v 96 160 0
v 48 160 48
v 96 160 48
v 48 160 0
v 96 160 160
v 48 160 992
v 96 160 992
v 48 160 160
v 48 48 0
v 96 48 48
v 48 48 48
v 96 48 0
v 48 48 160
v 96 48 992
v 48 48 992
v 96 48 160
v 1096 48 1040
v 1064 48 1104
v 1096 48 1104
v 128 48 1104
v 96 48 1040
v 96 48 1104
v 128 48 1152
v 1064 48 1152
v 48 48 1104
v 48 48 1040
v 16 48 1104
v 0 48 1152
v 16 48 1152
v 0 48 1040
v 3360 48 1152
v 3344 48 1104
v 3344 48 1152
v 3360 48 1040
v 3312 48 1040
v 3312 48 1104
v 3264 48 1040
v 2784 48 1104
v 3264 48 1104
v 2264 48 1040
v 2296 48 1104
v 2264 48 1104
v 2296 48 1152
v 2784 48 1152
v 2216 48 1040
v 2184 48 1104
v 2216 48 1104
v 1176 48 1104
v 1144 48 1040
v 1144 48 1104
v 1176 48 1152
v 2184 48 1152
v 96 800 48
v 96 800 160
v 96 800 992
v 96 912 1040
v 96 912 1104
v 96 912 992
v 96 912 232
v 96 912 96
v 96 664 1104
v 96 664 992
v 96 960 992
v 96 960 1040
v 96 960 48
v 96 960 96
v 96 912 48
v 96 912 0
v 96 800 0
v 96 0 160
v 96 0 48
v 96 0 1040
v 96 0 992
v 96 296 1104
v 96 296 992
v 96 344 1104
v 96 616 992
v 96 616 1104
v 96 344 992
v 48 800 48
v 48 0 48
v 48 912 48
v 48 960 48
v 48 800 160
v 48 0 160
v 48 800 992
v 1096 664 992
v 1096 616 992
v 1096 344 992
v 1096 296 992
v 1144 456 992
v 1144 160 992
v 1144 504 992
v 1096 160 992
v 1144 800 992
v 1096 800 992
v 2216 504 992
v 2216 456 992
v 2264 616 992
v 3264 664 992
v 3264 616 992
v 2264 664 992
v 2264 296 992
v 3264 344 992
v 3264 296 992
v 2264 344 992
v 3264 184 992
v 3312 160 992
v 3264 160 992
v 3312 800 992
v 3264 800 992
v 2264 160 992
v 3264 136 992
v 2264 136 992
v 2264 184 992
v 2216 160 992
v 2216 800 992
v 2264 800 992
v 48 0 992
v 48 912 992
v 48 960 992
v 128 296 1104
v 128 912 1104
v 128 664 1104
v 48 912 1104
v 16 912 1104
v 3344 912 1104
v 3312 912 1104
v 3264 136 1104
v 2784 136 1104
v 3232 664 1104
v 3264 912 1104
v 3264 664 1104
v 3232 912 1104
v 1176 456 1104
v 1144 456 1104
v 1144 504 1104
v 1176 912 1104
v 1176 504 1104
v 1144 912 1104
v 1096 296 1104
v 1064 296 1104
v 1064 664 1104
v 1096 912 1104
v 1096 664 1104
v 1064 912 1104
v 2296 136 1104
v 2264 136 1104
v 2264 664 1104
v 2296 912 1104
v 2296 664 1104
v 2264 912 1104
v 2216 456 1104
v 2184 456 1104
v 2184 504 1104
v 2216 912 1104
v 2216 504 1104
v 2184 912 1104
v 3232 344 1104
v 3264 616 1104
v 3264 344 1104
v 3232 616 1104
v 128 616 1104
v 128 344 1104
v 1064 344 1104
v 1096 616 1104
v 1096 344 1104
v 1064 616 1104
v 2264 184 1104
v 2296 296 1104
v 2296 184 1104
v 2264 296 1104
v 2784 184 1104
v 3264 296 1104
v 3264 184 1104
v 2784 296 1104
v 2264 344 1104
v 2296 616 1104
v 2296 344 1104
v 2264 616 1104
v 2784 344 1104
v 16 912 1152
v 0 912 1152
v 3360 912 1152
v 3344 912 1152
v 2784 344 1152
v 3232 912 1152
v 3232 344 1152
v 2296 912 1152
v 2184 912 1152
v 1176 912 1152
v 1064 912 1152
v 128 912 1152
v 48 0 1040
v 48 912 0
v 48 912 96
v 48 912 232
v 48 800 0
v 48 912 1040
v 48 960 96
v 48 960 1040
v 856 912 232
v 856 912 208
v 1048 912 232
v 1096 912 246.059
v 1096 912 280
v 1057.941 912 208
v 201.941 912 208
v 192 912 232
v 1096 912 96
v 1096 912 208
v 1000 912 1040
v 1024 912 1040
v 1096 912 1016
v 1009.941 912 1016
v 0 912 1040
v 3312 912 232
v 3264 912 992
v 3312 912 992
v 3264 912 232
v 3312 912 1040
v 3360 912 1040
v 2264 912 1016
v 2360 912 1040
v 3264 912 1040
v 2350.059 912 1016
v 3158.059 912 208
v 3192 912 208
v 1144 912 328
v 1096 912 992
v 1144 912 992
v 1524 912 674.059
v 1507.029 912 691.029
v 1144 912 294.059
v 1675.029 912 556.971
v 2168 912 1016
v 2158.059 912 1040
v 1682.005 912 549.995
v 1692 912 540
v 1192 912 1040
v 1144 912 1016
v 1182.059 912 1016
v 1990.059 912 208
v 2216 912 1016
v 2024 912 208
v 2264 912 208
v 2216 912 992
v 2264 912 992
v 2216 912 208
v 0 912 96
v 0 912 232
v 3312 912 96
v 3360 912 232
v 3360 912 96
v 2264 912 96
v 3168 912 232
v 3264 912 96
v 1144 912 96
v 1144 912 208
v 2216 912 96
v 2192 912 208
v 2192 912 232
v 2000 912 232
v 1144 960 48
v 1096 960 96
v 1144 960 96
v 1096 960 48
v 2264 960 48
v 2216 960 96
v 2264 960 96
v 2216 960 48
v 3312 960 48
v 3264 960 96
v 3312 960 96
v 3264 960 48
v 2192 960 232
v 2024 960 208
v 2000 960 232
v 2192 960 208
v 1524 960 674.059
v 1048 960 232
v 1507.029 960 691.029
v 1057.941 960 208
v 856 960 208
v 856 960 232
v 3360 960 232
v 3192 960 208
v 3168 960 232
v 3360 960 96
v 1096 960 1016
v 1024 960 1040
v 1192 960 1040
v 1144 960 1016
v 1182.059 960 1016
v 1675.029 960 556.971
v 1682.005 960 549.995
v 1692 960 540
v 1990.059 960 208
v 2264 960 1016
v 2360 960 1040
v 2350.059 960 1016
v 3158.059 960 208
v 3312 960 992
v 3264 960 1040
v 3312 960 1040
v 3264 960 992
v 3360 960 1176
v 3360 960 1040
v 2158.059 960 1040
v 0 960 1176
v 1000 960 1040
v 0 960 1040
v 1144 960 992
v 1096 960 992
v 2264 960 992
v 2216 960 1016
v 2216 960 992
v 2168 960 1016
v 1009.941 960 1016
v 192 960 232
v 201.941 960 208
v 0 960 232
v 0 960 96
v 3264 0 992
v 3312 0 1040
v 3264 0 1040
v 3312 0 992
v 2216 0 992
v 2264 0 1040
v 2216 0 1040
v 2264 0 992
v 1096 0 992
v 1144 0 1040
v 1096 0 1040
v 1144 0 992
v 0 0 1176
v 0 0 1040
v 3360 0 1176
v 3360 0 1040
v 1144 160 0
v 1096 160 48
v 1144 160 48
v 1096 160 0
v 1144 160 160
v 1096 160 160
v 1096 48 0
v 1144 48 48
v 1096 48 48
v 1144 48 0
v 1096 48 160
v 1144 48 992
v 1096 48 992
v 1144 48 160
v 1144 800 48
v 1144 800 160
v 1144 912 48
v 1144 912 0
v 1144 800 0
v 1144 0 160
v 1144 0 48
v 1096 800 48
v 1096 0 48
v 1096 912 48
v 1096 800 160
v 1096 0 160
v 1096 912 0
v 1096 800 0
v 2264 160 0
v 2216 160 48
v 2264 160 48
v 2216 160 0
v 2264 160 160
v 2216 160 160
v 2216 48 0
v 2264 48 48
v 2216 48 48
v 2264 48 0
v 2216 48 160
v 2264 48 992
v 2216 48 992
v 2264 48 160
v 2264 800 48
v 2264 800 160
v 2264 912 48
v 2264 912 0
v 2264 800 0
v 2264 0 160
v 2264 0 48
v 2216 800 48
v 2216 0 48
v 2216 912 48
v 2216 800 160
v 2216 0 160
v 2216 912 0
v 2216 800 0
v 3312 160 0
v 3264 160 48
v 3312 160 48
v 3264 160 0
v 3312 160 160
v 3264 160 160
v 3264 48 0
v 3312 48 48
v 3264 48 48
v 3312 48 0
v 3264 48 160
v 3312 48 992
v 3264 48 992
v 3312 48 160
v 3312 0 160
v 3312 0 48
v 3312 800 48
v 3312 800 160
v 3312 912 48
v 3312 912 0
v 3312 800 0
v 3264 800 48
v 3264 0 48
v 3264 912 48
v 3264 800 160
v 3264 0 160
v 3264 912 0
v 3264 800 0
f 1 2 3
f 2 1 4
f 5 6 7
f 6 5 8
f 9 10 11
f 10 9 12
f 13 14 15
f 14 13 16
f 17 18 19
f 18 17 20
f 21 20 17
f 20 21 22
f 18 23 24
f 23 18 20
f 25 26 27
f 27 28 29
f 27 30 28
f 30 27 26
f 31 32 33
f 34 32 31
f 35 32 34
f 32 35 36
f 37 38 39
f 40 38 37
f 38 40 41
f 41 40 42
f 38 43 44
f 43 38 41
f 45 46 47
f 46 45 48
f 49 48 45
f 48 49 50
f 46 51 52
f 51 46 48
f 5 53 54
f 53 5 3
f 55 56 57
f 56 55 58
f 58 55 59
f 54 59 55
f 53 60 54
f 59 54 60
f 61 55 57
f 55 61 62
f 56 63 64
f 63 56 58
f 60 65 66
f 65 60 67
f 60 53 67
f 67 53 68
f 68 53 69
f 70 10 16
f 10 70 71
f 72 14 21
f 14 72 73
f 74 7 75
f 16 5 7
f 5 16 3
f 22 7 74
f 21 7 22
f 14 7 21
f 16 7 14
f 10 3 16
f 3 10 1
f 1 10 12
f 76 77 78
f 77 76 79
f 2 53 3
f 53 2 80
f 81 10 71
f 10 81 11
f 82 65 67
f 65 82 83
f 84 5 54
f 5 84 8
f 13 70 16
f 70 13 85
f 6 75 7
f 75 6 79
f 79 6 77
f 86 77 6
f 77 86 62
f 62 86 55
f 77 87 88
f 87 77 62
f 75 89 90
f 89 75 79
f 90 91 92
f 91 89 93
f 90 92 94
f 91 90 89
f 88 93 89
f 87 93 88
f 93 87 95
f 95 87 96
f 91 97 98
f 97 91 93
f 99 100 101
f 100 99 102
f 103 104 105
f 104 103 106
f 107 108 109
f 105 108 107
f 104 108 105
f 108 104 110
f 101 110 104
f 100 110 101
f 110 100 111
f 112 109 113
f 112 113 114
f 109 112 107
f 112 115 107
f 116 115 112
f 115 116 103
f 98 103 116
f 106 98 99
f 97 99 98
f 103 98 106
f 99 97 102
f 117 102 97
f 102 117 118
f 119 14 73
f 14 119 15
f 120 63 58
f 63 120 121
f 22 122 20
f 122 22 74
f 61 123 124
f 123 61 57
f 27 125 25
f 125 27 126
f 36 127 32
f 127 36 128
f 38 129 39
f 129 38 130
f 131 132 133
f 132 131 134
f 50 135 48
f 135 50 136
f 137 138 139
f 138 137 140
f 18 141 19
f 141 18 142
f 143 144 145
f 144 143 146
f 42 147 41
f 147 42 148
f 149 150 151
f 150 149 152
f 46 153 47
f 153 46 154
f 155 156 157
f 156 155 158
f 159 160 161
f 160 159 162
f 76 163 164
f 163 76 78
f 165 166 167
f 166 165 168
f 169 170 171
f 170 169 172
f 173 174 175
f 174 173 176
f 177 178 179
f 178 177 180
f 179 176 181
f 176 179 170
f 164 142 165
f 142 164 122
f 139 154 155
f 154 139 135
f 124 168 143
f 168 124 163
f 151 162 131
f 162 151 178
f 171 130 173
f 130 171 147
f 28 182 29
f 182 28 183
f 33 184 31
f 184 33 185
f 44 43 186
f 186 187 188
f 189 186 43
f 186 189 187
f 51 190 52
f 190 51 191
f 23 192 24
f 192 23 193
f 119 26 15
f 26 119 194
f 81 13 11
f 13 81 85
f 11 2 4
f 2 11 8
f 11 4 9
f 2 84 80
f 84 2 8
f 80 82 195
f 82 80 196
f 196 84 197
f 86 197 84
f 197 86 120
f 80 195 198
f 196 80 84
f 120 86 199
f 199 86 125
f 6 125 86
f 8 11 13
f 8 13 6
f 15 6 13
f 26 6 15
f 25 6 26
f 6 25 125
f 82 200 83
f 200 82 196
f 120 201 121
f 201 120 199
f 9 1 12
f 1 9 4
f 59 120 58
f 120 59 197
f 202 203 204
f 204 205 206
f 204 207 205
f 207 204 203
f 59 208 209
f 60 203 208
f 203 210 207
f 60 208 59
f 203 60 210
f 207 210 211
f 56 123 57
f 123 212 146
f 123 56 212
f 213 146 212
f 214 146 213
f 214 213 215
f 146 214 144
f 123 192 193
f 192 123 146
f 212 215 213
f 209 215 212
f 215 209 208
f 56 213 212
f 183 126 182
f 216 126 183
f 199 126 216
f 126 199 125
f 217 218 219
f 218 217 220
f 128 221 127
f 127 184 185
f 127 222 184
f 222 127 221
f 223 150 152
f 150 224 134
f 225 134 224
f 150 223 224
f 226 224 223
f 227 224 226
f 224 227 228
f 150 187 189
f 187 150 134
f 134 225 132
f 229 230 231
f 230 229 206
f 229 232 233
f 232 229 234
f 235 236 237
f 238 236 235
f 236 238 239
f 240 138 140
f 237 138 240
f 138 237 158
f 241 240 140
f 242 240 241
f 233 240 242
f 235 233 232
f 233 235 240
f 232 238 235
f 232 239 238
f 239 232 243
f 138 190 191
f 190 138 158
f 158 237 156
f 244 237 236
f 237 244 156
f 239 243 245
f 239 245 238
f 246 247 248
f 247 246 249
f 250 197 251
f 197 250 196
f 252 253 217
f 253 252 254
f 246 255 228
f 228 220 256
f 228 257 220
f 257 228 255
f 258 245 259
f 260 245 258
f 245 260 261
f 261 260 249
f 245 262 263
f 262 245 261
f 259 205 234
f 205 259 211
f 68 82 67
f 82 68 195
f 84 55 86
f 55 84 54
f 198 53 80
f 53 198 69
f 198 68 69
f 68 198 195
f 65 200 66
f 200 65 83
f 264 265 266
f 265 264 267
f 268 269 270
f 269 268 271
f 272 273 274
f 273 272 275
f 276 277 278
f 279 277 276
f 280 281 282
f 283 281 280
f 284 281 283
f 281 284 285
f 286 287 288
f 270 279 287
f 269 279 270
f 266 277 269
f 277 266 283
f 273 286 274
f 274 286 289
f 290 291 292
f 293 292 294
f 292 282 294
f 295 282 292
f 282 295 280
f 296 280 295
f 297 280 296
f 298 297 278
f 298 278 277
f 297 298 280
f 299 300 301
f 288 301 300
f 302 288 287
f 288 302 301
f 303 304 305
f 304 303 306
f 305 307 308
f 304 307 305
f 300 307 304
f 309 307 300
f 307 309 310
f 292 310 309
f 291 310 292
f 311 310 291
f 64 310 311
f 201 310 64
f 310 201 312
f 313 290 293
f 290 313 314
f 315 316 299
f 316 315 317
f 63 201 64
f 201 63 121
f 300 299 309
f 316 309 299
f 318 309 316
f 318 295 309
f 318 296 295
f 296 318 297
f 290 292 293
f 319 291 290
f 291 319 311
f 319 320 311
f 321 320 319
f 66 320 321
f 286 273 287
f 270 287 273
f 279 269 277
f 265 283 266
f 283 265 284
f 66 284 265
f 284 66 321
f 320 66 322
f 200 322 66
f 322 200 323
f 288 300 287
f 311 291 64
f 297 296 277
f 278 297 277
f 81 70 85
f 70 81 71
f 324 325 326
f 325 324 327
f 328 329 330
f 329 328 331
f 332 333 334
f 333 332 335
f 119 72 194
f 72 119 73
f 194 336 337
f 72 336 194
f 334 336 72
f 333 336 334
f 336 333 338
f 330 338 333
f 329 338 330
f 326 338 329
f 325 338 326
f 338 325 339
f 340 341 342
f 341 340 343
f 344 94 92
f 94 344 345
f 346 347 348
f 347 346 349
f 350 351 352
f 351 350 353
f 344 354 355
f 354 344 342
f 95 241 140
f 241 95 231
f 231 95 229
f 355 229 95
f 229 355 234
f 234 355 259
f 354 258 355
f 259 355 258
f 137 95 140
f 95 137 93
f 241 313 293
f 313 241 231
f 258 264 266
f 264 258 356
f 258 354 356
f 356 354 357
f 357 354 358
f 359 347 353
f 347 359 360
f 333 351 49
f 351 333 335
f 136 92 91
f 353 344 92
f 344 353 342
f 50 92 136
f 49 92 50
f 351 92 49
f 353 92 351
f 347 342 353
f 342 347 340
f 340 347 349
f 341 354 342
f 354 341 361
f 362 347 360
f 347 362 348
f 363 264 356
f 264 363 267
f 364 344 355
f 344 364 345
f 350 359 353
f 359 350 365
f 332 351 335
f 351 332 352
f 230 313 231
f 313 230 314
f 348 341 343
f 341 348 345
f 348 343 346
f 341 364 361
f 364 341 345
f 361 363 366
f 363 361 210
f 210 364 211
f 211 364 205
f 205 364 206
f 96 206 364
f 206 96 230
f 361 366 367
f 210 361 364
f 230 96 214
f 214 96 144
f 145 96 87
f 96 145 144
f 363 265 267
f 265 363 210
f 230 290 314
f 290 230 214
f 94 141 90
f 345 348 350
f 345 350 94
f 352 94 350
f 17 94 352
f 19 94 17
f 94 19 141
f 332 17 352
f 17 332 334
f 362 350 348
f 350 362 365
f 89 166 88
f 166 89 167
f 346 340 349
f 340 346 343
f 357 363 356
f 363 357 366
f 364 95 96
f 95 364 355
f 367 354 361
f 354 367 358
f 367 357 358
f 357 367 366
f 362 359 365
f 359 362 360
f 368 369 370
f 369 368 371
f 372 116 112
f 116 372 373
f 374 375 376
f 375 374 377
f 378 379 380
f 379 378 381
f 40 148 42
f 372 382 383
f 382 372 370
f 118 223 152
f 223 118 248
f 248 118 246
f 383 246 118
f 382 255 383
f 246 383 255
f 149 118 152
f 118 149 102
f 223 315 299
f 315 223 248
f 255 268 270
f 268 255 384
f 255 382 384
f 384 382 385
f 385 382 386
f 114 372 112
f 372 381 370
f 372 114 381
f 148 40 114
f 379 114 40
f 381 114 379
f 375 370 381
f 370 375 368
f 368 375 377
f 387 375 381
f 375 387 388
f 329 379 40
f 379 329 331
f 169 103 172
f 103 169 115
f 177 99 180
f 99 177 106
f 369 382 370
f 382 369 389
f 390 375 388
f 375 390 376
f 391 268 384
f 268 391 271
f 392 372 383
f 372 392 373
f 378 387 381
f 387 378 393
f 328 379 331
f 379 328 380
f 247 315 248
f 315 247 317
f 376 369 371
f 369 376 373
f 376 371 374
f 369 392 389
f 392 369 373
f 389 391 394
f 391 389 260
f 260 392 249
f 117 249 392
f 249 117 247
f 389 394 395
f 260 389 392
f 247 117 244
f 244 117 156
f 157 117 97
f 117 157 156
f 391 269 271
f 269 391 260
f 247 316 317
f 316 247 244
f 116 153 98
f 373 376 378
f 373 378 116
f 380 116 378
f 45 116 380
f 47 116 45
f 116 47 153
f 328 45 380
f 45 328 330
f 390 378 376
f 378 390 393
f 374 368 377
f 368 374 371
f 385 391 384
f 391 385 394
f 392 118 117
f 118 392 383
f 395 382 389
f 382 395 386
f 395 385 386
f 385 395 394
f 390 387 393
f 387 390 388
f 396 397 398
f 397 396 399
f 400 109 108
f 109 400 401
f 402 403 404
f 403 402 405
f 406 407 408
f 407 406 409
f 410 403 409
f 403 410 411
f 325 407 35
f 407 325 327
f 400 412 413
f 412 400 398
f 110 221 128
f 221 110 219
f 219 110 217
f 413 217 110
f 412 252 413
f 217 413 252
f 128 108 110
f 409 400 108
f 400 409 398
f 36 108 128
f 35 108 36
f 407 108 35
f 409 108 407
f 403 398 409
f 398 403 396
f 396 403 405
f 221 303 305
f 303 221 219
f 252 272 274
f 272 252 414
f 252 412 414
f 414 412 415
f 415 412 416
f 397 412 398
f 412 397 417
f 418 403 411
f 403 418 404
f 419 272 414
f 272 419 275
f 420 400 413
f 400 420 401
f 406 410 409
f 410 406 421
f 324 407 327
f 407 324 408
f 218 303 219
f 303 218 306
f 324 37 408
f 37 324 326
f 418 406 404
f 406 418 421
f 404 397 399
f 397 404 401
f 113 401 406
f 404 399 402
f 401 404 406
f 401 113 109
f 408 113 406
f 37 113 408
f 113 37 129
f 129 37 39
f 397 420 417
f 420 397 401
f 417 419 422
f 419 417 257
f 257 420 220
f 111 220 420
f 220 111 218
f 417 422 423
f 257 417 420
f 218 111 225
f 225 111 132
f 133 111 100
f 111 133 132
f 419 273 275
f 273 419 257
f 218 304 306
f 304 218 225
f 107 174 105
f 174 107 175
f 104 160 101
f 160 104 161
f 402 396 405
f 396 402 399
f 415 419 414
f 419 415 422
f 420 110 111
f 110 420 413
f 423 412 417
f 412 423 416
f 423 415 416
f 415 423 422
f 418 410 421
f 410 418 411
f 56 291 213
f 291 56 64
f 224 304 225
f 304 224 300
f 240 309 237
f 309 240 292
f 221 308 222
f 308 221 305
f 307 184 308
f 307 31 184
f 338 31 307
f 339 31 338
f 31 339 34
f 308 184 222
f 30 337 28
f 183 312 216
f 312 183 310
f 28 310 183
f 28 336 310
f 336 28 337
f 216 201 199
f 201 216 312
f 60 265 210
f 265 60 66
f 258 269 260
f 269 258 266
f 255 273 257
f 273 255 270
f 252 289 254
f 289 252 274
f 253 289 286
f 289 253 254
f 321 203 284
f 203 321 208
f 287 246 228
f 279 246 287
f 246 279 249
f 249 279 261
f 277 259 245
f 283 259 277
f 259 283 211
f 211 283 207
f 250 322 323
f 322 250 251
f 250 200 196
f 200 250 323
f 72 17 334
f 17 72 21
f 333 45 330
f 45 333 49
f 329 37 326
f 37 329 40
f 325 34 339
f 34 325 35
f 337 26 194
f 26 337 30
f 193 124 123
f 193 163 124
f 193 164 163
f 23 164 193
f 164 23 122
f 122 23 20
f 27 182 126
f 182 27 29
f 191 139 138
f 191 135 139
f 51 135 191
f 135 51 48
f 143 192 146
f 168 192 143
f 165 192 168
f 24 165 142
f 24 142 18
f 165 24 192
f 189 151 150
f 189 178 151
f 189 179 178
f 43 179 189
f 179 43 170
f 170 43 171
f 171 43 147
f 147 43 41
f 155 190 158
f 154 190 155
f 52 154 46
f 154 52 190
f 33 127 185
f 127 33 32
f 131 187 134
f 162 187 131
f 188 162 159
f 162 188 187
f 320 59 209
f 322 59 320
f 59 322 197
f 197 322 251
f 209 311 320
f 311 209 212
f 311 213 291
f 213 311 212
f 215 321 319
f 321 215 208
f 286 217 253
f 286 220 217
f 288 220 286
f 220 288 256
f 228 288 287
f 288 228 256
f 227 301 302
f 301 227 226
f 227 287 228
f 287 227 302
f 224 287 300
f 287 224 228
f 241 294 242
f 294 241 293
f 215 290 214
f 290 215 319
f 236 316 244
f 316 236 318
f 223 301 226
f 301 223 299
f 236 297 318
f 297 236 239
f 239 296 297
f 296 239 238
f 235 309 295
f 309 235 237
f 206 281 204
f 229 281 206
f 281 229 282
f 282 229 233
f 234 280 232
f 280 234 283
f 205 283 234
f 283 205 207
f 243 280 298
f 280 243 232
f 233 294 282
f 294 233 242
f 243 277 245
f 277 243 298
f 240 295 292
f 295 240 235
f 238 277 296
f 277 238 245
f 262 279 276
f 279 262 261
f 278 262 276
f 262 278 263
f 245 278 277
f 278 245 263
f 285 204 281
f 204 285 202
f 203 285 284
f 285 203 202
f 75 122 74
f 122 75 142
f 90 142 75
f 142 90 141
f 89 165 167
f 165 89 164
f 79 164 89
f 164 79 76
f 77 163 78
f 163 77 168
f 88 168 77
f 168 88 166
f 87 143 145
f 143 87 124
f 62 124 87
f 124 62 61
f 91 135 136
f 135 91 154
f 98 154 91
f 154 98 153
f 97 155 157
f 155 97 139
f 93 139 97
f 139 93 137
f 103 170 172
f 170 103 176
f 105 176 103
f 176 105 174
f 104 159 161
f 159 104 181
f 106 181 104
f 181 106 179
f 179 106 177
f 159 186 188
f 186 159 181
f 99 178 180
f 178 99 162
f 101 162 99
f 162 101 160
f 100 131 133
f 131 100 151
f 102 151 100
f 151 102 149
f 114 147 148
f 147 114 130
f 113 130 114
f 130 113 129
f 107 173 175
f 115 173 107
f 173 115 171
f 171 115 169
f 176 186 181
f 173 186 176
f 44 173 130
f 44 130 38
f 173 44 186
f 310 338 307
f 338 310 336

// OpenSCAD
// file: cmnMember.scad
include <scale.scad>

module cmnMmbr(cmnMmbrLen)
{
    points = [
    [0,0], //0
    [0,2b4H], //1
    [2b4H,2b4H], //2
    [2b4H,2b4H / 2], //3
    [2b4H + 2b4W,2b4H / 2], //4
    [2b4H + 2b4W,2b4H], //5
    [cmnMmbrLen - 2b4H - 2b4W,2b4H], //7
    [cmnMmbrLen - 2b4H - 2b4W,2b4H / 2], //6
    [cmnMmbrLen - 2b4H,2b4H / 2], //8
    [cmnMmbrLen - 2b4H,2b4H], //9
    [cmnMmbrLen,2b4H], //11
    [cmnMmbrLen,0]]; //10
  
    linear_extrude(2b4W)
    {
        polygon(points);
    }
}
// file: twobyfour.scad
include <scale.scad>

module twobyfour(2b4L)
{
    cube([2b4L,2b4W,2b4H]);
}
// file: onebytwo.scad
include <scale.scad>

module 1b2(len)
{
    cube([1b2W,1b2H,len]);
}
// 45 degree angle on 1 end
module 1b245(len)
{
    points = [
    [0,0],  //0
    [1b2H,1b2H],  //1
    [len,1b2H],  //2
    [len,0]];  //3

    translate([0,2b4H,0])
    {
        rotate([0,0,180])
        {
            linear_extrude(2b4H)
            {
                polygon(points);
            }
        }
    }  
}

//45 degree angle on both ends
module 1b22x45(len)
{
    points = [
    [0,0],  //0
    [1b2H,1b2H],  //1
    [len + 1b2H,1b2H],  //2
    [len,0]];  //3

    translate([0,0,1b2H])
    {
        rotate([-90,0,0])
        {
            linear_extrude(2b4H)
            {
                polygon(points);
            }
        }
    }  
}

//45 degree angle on both ends opposite angle
module 1b22x45Opp(len)
{
    points = [
    [0,0],  //0
    [1b2H,1b2H],  //1
    [len - 1b2H,1b2H],  //2
    [len,0]];  //3

    translate([0,1b2W,0])
    {
        rotate([90,0,0])
        {
            linear_extrude(2b4H)
            {
                polygon(points);
            }
        }
    }  
}
// file: topHorMmbr.scad
include <scale.scad>

thmA = 2b4W - 2b4H;
thmB = thmA / 2;

module topHorMmbr(len)
{
    points = [
    [0,0], //0
    [0,thmB], //1
    [2b4W,thmB], //2
    [2b4W,thmB + 2b4H], //3
    [0,thmB + 2b4H], //4
    [0,2b4W], //5
    [len,2b4W], //6
    [len,thmB + 2b4H], //7
    [len - 2b4W,thmB + 2b4H], //8
    [len - 2b4W,thmB], //9
    [len,thmB], //10
    [len,0]]; //11
  
    translate([0,2b4H,0])
    {
        rotate([90,0,0])
        {
            linear_extrude(2b4H)
            {
                polygon(points);
            }
        }
    }
}
// file: horMmbr.scad
include <scale.scad>

module horMmbr(len)
{
    A = (len / 3) + (2b4H / 2);
    B = (2 * (len / 3)) + (2b4H / 2);
    C = 2b4W - 2b4H;
    
    points = [
    [0,0], //0
    [0,2b4W], //1
    [len,2b4W], //2
    [len,0], //3
    [len - 2b4H,0], //4
    [len - 2b4H,C], //5
    [len - (2 * 2b4H),C], //6
    [len - (2 * 2b4H),0], //7
    [B,0], //8
    [B,C], //9
    [B - 2b4H,C], //10
    [B - 2b4H,0], //11
    [A, 0], //12
    [A, C], //13
    [A - 2b4H, C], //14
    [A - 2b4H,0], //15
    [2 * 2b4H,0], //16
    [2 * 2b4H,C], //17
    [2b4H,C], //18
    [2b4H,0]]; //19

    translate([0,2b4H,0])
    {
        rotate([90,0,0])
        {
            linear_extrude(2b4H)
            {
                polygon(points);
            }
        }
    }
}
// file: sqrMmbr.scad
include <scale.scad>
include <cmnMember.scad>

module virtMmbr(mbrlen)
{
    translate([0,2b4W,mbrlen])
    {
        rotate([90,90,0])
        {
            cmnMmbr(mbrlen);
        }
    }
}

module horizMmbr(mbrlen)
{
    translate([2b4H,mbrlen,2b4W])
    {
        rotate([0,180,90])
        {
            cmnMmbr(mbrlen);
        }
    }
}

module sqrMmbr(vlen,hlen)
{
    translate([0,2b4H,0])
    {
        virtMmbr(vlen);
    }
    translate([0,hlen - 2b4H - 2b4W,0])
    {
        virtMmbr(vlen);
    }
    translate([0,0,2b4H])
    {
        horizMmbr(hlen);
    }
    translate([0,0,vlen - 2b4H - 2b4W])
    {
        horizMmbr(hlen);
    }
}
// file: scale.scad
scale = 32;
2b4W = (7 / 2) * scale;
2b4H = (3 / 2) * scale;
1b4W = (7 / 2) * scale;
1b4H = (3 / 4) * scale;
1b2W = (3 / 2) * scale;
1b2H = (3 / 4) * scale;
// main file
include <scale.scad>
include <sqrMmbr.scad>
include <horMmbr.scad>
include <topHorMmbr.scad>
include <onebytwo.scad>
include <twobyfour.scad>

ht = 36 * scale;
dpth = 30 * scale;
//wdth = 136 * scale;
wdth = 105 * scale;
chklen = 6 * scale;

A = (wdth / 3) - (2b4H / 2);
B = (2 * (wdth / 3)) - (2b4H / 2);
C = 2b4H - ((2b4W - 2b4H) / 2);
D = ht - (2 * 2b4W) - (2 * 2b4H);
E = sqrt(2 * D * D);
F = sqrt(2 * 1b2H * 1b2H);
G = sqrt((1b2H * 1b2H) / 2);
H = (2 * chklen) + D;
I = (2 * 2b4H) + 2b4W;
//J = (wdth / 3) - 2b4H - (2 * G);
J = (wdth - H + (2 * 1b2H)) - (D + chklen - 1b2H + chklen - F);
K = J / 2;
L = sqrt(2 * K * K);

translate([2b4H,0,0])
{
    sqrMmbr(ht,dpth);
}
translate([A, 0, 0])
{
    sqrMmbr(ht,dpth);
}
translate([B, 0, 0])
{
    sqrMmbr(ht,dpth);
}
translate([wdth - (2 * 2b4H), 0, 0])
{
    sqrMmbr(ht,dpth);
}
translate([0,dpth - 2b4H,ht - 2b4H - 2b4W + 2b4H])
{
    horMmbr(wdth);
}
translate([0,dpth - 2b4H,2b4H + 2b4H])
{
    horMmbr(wdth);
}
translate([0,0,ht - 2b4H - 2b4W + 2b4H])
{
    horMmbr(wdth);
}
translate([C,2b4H,ht - 2b4H])
{
    rotate([90,0,90])
    {
        topHorMmbr(dpth - (2 * 2b4H));
    }
}
translate([C - 2b4H + A,2b4H,ht - 2b4H])
{
    rotate([90,0,90])
    {
        topHorMmbr(dpth - (2 * 2b4H));
    }
}
translate([C - 2b4H + B,2b4H,ht - 2b4H])
{
    rotate([90,0,90])
    {
        topHorMmbr(dpth - (2 * 2b4H));
    }
}
translate([wdth - 2b4W - C,2b4H,ht - 2b4H])
{
    rotate([90,0,90])
    {
        topHorMmbr(dpth - (2 * 2b4H));
    }
}
translate([chklen,dpth,2b4H + 2b4W + 1b2H])
{
    rotate([90,0,0])
    {
        1b245(chklen);
    }
}
translate([chklen + F - 1b2H,dpth - 1b2W,2b4H + 2b4W + 2b4H])
{
    rotate([0,-45,0])
    {
        translate([-1b2H,0,0])
        {
            1b22x45(E);
        }
    }
}
translate([wdth - chklen,dpth - 1b2W,2b4H + 2b4W + 1b2H])
{
    rotate([90,0,180])
    {
        1b245(chklen);
    }
}
translate([wdth - chklen - D + 1b2H,dpth - 1b2W,I + D])
{
    rotate([180,45,0])
    {
        translate([-1b2H,-1b2W,0])
        {
            1b22x45(E);
        }
    }
}
translate([chklen - 1b2H + D,dpth - 1b2W,I + D - 1b2H])
{
    1b22x45Opp(chklen);
}
translate([wdth - H + 1b2H,dpth - 1b2W,I + D - 1b2H])
{
    1b22x45Opp(chklen);
}
translate([wdth - H + (2 * 1b2H),dpth - 1b2W,I + D])
{
    rotate([0,-45,0])
    {
        translate([0,0,(2 * 1b2H)])
        {
            rotate([-90,0,0])
            {
                1b245(L - 1b2H);
            }
        }
    }
}
translate([G + chklen + D,dpth - 1b2W,-G + I])
{
    rotate([0,-45,0])
    {
        translate([0,0,-1b2H])
        {
            rotate([90,0,180])
            {
                1b245(L - 1b2H);
            }
        }
    }
}
translate([H - 1b2H,dpth - 1b2W,I + D])
{
    rotate([180,45,0])
    {
        translate([-1b2H,-1b2W,0])
        {
            1b22x45(E);
        }
    }
}
translate([2 *(chklen + D - 1b2H),dpth - 1b2W,2b4H + 2b4W + 1b2H])
{
    rotate([90,0,180])
    {
        1b245(chklen);
    }
}
translate([chklen + D + 1b2H,dpth,-1b2H + I])
{
    rotate([90,0,0])
    {
        1b245(chklen);
    }
}
translate([(2 * 2b4H),(dpth / 3) + (2b4H / 2),ht - 2b4W - 2b4H])
{
    rotate([90,0,0])
    {
        twobyfour((wdth / 3) + (2b4H / 2) - (3 * 2b4H));
    }
}
translate([(2 * 2b4H),2 * (dpth / 3) + (2b4H / 2),ht - 2b4W - 2b4H])
{
    rotate([90,0,0])
    {
        twobyfour((wdth / 3) + (2b4H / 2) - (3 * 2b4H));
    }
}
translate([(2 * 2b4H) + (wdth / 3) + (2b4H / 2) - (2 *2b4H),(dpth / 2) + (2b4H / 2),ht - 2b4W - 2b4H])
{
    rotate([90,0,0])
    {
        twobyfour((wdth / 3) - 2b4H);
    }
}
translate([(2 * (wdth / 3)) + (2b4H / 2),(dpth / 3) + (2b4H / 2),ht - 2b4W - 2b4H])
{
    rotate([90,0,0])
    {
        twobyfour((wdth / 3) + (2b4H / 2) - (3 * 2b4H));
    }
}
translate([(2 * (wdth / 3)) + (2b4H / 2),(2 * (dpth / 3)) + (2b4H / 2),ht - 2b4W - 2b4H])
{
    rotate([90,0,0])
    {
        twobyfour((wdth / 3) + (2b4H / 2) - (3 * 2b4H));
    }
}
translate([(2 * (wdth / 3)) + (2b4H / 2),(dpth / 6) + (2b4H / 2),ht - 2b4W - 2b4H])
{
    rotate([90,0,0])
    {
        twobyfour((wdth / 3) + (2b4H / 2) - (3 * 2b4H));
    }
}
translate([(3 * (wdth / 3)) - (2 * 2b4H) - ((2b4W - 2b4H) / 2),2b4H,ht - 2b4H])
{
    rotate([0,0,90])
    {
        twobyfour((dpth / 3) - (2b4H / 2));
    }
}
translate([(3 * (wdth / 3)) - (2 * 2b4H) - ((2b4W - 2b4H) / 2) - 2b4W,2b4H,ht - 2b4H])
{
    rotate([0,0,90])
    {
        twobyfour((dpth / 3) - (2b4H / 2));
    }
}
translate([(3 * (wdth / 3)) - (2 * 2b4H) - ((2b4W - 2b4H) / 2) - (2 * 2b4W),2b4H,ht - 2b4H])
{
    rotate([0,0,90])
    {
        twobyfour((dpth / 3) - (2b4H / 2));
    }
}
translate([(3 * (wdth / 3)) - (2 * 2b4H) - ((2b4W - 2b4H) / 2) - (3 * 2b4W),2b4H,ht - 2b4H])
{
    rotate([0,0,90])
    {
        twobyfour((dpth / 3) - (2b4H / 2));
    }
}
translate([0,0,ht])
{
    cube([wdth,dpth,(3 / 4) * scale]);
}
